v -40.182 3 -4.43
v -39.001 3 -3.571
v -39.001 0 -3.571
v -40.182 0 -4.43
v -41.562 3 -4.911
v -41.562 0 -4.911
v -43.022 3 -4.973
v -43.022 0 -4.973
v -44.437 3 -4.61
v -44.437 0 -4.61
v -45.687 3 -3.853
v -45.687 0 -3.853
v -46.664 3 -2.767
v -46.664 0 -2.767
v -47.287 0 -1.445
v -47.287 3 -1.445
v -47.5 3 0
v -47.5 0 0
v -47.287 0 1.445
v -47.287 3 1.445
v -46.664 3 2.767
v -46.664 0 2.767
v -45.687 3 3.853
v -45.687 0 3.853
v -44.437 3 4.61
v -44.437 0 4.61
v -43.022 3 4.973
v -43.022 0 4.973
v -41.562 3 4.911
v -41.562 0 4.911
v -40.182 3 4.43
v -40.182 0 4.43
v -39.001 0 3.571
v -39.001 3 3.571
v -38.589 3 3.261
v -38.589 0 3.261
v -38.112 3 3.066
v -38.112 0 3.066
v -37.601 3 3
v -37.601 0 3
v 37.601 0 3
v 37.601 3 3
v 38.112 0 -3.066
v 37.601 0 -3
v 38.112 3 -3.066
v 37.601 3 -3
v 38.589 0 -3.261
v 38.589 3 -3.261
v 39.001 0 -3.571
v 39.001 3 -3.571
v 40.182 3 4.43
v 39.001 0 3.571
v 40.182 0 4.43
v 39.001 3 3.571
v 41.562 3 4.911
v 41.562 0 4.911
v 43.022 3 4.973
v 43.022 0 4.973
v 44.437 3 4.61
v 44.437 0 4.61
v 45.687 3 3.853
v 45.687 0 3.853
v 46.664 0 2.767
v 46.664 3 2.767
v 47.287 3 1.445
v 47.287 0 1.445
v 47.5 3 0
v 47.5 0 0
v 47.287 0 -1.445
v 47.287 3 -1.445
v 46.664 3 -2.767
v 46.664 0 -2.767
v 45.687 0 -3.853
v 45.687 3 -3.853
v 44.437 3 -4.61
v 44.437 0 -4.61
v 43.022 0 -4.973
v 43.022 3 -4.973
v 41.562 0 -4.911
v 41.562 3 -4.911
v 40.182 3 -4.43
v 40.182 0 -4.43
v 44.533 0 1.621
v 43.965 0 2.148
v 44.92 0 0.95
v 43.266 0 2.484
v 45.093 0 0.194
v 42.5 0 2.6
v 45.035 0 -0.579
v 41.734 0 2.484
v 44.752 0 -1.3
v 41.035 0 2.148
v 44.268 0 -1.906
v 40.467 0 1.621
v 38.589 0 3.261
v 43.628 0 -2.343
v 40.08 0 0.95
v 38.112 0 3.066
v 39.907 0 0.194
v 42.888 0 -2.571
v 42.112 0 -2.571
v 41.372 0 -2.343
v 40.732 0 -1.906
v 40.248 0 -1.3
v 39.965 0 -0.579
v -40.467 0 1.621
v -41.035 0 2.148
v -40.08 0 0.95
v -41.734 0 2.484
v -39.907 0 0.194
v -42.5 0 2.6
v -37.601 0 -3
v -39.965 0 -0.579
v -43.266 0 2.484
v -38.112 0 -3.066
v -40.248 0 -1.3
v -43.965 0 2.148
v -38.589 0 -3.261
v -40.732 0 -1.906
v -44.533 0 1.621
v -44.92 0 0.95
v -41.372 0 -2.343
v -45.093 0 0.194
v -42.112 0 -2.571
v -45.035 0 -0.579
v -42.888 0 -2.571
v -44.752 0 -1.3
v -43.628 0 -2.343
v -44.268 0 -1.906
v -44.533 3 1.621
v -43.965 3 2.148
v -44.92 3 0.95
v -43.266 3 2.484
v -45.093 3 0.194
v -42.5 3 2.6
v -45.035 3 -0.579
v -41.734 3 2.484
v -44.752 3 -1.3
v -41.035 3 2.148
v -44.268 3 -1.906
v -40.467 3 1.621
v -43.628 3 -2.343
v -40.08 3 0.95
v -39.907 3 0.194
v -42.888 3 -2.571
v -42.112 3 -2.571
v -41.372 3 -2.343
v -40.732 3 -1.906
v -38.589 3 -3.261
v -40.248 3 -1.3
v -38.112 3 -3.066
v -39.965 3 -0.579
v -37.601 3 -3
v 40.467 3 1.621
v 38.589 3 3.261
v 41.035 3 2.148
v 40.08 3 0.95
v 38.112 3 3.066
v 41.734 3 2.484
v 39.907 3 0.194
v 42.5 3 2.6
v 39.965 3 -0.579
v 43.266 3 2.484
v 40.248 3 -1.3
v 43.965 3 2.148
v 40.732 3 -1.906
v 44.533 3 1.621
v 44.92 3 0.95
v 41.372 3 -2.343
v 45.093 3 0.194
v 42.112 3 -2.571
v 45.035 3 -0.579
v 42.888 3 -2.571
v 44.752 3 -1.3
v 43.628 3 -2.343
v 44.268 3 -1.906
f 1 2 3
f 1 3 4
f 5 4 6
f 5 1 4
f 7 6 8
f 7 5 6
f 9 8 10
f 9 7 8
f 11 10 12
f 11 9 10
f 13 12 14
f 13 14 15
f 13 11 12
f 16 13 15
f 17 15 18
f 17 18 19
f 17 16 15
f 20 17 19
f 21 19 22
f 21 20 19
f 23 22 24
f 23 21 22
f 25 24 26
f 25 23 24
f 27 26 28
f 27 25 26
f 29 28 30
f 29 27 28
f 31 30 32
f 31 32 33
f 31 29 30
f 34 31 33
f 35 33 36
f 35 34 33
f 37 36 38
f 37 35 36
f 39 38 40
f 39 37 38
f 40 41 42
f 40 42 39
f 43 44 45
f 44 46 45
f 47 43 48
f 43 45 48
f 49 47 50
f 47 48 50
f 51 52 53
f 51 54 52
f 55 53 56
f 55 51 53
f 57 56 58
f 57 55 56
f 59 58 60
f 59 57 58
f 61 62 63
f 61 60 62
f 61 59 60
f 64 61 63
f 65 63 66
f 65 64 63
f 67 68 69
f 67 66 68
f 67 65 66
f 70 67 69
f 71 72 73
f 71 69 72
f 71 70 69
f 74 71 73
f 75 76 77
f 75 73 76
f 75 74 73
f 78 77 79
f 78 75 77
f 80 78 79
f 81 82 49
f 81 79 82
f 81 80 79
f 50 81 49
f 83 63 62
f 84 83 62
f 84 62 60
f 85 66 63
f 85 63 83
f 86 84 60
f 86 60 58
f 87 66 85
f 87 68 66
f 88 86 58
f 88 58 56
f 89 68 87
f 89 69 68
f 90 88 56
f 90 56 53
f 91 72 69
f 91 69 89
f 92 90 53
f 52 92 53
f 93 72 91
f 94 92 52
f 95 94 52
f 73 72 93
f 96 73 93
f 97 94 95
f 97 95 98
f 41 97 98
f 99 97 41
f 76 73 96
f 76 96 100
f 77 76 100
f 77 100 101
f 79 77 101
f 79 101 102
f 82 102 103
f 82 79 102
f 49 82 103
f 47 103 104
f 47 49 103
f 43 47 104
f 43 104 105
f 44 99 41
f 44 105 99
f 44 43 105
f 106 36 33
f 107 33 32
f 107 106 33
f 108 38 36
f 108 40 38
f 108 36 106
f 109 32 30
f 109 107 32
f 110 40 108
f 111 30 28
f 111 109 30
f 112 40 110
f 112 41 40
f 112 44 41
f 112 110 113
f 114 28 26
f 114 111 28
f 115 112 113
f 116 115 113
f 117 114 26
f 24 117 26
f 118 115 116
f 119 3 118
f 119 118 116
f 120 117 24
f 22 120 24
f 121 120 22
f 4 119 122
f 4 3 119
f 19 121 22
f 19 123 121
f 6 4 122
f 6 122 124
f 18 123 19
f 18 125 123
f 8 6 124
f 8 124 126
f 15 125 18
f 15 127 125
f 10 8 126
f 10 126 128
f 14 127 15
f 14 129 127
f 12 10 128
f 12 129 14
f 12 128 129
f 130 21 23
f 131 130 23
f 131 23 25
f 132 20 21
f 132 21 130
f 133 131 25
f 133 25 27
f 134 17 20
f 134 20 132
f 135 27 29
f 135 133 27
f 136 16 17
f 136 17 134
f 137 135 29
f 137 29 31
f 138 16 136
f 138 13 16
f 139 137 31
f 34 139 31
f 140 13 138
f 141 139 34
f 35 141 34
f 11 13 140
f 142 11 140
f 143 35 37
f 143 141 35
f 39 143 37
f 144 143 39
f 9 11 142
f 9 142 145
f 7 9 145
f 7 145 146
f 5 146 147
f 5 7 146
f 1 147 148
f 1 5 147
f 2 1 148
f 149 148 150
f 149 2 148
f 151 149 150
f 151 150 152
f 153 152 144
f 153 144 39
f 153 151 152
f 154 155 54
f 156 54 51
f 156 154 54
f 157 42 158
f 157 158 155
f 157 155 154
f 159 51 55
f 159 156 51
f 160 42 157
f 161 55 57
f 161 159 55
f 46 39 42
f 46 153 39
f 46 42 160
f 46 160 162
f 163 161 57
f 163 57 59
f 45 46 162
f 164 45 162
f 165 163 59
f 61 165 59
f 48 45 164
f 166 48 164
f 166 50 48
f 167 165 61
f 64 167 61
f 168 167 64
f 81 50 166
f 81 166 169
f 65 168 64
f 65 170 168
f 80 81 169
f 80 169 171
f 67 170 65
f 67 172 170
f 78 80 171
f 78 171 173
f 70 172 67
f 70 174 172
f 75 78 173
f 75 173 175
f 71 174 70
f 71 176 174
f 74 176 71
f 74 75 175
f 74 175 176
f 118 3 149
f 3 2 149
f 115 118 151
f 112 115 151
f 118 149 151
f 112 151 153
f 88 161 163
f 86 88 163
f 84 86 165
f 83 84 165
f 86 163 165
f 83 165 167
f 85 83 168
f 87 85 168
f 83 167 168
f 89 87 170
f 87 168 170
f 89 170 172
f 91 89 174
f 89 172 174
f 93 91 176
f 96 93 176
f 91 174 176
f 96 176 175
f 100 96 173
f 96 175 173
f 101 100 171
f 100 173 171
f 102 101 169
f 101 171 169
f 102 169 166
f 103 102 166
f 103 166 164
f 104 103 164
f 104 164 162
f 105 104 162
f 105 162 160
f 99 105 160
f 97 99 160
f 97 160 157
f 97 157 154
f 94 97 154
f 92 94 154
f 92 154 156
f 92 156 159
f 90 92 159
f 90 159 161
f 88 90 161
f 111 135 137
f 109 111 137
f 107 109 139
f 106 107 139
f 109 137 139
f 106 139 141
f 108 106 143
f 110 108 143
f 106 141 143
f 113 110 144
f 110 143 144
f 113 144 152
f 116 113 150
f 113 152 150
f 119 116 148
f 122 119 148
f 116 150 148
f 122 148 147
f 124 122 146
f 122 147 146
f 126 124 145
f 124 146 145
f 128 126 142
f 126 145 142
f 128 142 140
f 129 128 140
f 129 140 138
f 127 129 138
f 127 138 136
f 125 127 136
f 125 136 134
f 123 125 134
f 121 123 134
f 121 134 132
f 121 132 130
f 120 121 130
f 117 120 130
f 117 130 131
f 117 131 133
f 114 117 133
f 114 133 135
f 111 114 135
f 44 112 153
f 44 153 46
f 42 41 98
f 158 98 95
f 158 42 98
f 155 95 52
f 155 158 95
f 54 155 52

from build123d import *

# Parameters (mm, degrees)
EXTRUDE_1_DEPTH     = 3
SKETCH_2_R          = 5
EXTRUDE_2_DEPTH     = 3
SKETCH_3_R          = 2.6
CUT_EXTRUDE_1_DEPTH = 10
FILLET_1_R          = 2


with BuildPart() as part:
    # ｽｹｯﾁ1 → ﾎﾞｽ - 押し出し1 (new body)
    with BuildSketch(Plane(origin=(0, 0, 0), x_dir=(1, 0, 0), z_dir=(0, 1, 0))):
        with BuildLine():
            Line((-42.5, 3), (42.5, 3))
            ThreePointArc((42.5, 3), (45.5, 0), (42.5, -3))
            Line((42.5, -3), (-42.5, -3))
            ThreePointArc((-42.5, -3), (-45.5, 0), (-42.5, 3))
        make_face()
    extrude(amount=EXTRUDE_1_DEPTH)

    # ｽｹｯﾁ2 → ﾎﾞｽ - 押し出し2 (add)
    with BuildSketch(Plane(origin=(0, 3, 0), x_dir=(1, 0, 0), z_dir=(0, 1, 0))):
        with Locations((-42.5, 0)):
            Circle(SKETCH_2_R)
        with Locations((42.5, 0)):
            Circle(SKETCH_2_R)
    extrude(amount=-EXTRUDE_2_DEPTH)

    # ｽｹｯﾁ3 → ｶｯﾄ - 押し出し1 (cut)
    with BuildSketch(Plane(origin=(0, 3, 0), x_dir=(1, 0, 0), z_dir=(0, 1, 0))):
        with Locations(Location((-42.5, 0, 0), (0, 0, 270))):
            Circle(SKETCH_3_R)
        with Locations(Location((42.5, 0, 0), (0, 0, 270))):
            Circle(SKETCH_3_R)
    extrude(amount=-CUT_EXTRUDE_1_DEPTH, mode=Mode.SUBTRACT)

    # ﾌｨﾚｯﾄ1
    fillet_1_edges = [part.edges().sort_by_distance(p)[0] for p in [
        (-38.5, 1.5, 3),
        (-38.5, 1.5, -3),
        (38.5, 1.5, 3),
        (38.5, 1.5, -3),
    ]]
    fillet(fillet_1_edges, radius=FILLET_1_R)


solid = part.part
